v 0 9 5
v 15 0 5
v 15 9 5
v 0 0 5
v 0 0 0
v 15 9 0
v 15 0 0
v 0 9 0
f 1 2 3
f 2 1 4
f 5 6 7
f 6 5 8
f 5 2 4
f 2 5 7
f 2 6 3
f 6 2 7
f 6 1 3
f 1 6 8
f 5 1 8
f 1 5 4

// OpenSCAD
// Generated by SolidPython 1.0.1 on 2020-07-29 00:46:55


cube(size = [15, 9, 5]);
/***********************************************
*********      SolidPython code:      **********
************************************************
 
# import packages: SolidPython
from solid import *
from solid.utils import *
from itertools import chain, combinations, permutations


class Resize:

    def __init__(self, scad_file):
        self.scad_file = scad_file
        #self.scad_file = import_scad(scad_file)
        # cone/cylinder param:
        self.r1 = 0
        self.r2 = 0
        self.h = 0
        # rectangular prism param:
        self.w = 0
        self.l = 0
        # ellipse param:
        self.r = 0

    # import OpenScad code (file name corresponds to shape)


    # classify shape + parameters
    def assign(self, param1, param2, param3):
        if self.scad_file == 'cone.scad':
            self.r1 = param1
            self.r2 = param2
            self.h = param3
        elif self.scad_file == 'cylinder.scad':
            self.r1 = param1
            self.r2 = param2
            self.h = param3
        elif self.scad_file == 'rectangularPrism.scad':
            self.h = param1
            self.l = param2
            self.w = param3
        else:
            self.r = param1
            self.h = param2

    # resize parameters
    def iterate(self):
        x = range(3, 20, 2)
        i = 1
        if self.scad_file == 'cone.scad':
            tempList = list(permutations(x, 2))
            for temp in tempList:
                param1 = temp[0]
                param2 = temp[1]
                filepath = 'produced_scad_files/' + 'cone' + str(param1) + '_' + str(param2) + '_' + '.scad'
                scad_render_to_file(cylinder(h=param1, r1=param2, r2=0), filepath)

        elif self.scad_file == 'cylinder.scad':
            tempList = list(permutations(x, 3))
            for temp in tempList:
                param1 = temp[0]
                param2 = temp[1]
                filepath = 'produced_scad_files/' + 'cylinder' + str(param1) + '_' + str(param2) + '_' + '.scad'
                scad_render_to_file(cylinder(h=param1, r1=param2, r2=param2), filepath)

        elif self.scad_file == 'rectangularPrism.scad':
            tempList = list(permutations(x, 3))
            for temp in tempList:
                param1 = temp[0]
                param2 = temp[1]
                param3 = temp[2]
                filepath = 'produced_scad_files/' + 'rectangularPrism' + str(param1) + '_' + str(param2) + '_' + str(
                    param3) + '.scad'
                scad_render_to_file(cube(size=(param1, param2, param3)), filepath)

        elif self.scad_file == 'ellipse.scad':
            tempList = list(permutations(x, 4))
            for temp in tempList:
                param1 = temp[0]
                param2 = temp[1]
                param3 = temp[2]
                param4 = temp[3]
                filepath = 'produced_scad_files/' + 'ellipse' + str(param1) + '_' + str(param2) + '_' + str(param3) + '_' + str(param4) + '.scad'
                scad_render_to_file(scale([param1, param2, param3])(sphere(r=param4)), filepath)

    def render_to_scadfile(self):
        scad_render_to_file(scad, 'example.scad') 
 
************************************************/
